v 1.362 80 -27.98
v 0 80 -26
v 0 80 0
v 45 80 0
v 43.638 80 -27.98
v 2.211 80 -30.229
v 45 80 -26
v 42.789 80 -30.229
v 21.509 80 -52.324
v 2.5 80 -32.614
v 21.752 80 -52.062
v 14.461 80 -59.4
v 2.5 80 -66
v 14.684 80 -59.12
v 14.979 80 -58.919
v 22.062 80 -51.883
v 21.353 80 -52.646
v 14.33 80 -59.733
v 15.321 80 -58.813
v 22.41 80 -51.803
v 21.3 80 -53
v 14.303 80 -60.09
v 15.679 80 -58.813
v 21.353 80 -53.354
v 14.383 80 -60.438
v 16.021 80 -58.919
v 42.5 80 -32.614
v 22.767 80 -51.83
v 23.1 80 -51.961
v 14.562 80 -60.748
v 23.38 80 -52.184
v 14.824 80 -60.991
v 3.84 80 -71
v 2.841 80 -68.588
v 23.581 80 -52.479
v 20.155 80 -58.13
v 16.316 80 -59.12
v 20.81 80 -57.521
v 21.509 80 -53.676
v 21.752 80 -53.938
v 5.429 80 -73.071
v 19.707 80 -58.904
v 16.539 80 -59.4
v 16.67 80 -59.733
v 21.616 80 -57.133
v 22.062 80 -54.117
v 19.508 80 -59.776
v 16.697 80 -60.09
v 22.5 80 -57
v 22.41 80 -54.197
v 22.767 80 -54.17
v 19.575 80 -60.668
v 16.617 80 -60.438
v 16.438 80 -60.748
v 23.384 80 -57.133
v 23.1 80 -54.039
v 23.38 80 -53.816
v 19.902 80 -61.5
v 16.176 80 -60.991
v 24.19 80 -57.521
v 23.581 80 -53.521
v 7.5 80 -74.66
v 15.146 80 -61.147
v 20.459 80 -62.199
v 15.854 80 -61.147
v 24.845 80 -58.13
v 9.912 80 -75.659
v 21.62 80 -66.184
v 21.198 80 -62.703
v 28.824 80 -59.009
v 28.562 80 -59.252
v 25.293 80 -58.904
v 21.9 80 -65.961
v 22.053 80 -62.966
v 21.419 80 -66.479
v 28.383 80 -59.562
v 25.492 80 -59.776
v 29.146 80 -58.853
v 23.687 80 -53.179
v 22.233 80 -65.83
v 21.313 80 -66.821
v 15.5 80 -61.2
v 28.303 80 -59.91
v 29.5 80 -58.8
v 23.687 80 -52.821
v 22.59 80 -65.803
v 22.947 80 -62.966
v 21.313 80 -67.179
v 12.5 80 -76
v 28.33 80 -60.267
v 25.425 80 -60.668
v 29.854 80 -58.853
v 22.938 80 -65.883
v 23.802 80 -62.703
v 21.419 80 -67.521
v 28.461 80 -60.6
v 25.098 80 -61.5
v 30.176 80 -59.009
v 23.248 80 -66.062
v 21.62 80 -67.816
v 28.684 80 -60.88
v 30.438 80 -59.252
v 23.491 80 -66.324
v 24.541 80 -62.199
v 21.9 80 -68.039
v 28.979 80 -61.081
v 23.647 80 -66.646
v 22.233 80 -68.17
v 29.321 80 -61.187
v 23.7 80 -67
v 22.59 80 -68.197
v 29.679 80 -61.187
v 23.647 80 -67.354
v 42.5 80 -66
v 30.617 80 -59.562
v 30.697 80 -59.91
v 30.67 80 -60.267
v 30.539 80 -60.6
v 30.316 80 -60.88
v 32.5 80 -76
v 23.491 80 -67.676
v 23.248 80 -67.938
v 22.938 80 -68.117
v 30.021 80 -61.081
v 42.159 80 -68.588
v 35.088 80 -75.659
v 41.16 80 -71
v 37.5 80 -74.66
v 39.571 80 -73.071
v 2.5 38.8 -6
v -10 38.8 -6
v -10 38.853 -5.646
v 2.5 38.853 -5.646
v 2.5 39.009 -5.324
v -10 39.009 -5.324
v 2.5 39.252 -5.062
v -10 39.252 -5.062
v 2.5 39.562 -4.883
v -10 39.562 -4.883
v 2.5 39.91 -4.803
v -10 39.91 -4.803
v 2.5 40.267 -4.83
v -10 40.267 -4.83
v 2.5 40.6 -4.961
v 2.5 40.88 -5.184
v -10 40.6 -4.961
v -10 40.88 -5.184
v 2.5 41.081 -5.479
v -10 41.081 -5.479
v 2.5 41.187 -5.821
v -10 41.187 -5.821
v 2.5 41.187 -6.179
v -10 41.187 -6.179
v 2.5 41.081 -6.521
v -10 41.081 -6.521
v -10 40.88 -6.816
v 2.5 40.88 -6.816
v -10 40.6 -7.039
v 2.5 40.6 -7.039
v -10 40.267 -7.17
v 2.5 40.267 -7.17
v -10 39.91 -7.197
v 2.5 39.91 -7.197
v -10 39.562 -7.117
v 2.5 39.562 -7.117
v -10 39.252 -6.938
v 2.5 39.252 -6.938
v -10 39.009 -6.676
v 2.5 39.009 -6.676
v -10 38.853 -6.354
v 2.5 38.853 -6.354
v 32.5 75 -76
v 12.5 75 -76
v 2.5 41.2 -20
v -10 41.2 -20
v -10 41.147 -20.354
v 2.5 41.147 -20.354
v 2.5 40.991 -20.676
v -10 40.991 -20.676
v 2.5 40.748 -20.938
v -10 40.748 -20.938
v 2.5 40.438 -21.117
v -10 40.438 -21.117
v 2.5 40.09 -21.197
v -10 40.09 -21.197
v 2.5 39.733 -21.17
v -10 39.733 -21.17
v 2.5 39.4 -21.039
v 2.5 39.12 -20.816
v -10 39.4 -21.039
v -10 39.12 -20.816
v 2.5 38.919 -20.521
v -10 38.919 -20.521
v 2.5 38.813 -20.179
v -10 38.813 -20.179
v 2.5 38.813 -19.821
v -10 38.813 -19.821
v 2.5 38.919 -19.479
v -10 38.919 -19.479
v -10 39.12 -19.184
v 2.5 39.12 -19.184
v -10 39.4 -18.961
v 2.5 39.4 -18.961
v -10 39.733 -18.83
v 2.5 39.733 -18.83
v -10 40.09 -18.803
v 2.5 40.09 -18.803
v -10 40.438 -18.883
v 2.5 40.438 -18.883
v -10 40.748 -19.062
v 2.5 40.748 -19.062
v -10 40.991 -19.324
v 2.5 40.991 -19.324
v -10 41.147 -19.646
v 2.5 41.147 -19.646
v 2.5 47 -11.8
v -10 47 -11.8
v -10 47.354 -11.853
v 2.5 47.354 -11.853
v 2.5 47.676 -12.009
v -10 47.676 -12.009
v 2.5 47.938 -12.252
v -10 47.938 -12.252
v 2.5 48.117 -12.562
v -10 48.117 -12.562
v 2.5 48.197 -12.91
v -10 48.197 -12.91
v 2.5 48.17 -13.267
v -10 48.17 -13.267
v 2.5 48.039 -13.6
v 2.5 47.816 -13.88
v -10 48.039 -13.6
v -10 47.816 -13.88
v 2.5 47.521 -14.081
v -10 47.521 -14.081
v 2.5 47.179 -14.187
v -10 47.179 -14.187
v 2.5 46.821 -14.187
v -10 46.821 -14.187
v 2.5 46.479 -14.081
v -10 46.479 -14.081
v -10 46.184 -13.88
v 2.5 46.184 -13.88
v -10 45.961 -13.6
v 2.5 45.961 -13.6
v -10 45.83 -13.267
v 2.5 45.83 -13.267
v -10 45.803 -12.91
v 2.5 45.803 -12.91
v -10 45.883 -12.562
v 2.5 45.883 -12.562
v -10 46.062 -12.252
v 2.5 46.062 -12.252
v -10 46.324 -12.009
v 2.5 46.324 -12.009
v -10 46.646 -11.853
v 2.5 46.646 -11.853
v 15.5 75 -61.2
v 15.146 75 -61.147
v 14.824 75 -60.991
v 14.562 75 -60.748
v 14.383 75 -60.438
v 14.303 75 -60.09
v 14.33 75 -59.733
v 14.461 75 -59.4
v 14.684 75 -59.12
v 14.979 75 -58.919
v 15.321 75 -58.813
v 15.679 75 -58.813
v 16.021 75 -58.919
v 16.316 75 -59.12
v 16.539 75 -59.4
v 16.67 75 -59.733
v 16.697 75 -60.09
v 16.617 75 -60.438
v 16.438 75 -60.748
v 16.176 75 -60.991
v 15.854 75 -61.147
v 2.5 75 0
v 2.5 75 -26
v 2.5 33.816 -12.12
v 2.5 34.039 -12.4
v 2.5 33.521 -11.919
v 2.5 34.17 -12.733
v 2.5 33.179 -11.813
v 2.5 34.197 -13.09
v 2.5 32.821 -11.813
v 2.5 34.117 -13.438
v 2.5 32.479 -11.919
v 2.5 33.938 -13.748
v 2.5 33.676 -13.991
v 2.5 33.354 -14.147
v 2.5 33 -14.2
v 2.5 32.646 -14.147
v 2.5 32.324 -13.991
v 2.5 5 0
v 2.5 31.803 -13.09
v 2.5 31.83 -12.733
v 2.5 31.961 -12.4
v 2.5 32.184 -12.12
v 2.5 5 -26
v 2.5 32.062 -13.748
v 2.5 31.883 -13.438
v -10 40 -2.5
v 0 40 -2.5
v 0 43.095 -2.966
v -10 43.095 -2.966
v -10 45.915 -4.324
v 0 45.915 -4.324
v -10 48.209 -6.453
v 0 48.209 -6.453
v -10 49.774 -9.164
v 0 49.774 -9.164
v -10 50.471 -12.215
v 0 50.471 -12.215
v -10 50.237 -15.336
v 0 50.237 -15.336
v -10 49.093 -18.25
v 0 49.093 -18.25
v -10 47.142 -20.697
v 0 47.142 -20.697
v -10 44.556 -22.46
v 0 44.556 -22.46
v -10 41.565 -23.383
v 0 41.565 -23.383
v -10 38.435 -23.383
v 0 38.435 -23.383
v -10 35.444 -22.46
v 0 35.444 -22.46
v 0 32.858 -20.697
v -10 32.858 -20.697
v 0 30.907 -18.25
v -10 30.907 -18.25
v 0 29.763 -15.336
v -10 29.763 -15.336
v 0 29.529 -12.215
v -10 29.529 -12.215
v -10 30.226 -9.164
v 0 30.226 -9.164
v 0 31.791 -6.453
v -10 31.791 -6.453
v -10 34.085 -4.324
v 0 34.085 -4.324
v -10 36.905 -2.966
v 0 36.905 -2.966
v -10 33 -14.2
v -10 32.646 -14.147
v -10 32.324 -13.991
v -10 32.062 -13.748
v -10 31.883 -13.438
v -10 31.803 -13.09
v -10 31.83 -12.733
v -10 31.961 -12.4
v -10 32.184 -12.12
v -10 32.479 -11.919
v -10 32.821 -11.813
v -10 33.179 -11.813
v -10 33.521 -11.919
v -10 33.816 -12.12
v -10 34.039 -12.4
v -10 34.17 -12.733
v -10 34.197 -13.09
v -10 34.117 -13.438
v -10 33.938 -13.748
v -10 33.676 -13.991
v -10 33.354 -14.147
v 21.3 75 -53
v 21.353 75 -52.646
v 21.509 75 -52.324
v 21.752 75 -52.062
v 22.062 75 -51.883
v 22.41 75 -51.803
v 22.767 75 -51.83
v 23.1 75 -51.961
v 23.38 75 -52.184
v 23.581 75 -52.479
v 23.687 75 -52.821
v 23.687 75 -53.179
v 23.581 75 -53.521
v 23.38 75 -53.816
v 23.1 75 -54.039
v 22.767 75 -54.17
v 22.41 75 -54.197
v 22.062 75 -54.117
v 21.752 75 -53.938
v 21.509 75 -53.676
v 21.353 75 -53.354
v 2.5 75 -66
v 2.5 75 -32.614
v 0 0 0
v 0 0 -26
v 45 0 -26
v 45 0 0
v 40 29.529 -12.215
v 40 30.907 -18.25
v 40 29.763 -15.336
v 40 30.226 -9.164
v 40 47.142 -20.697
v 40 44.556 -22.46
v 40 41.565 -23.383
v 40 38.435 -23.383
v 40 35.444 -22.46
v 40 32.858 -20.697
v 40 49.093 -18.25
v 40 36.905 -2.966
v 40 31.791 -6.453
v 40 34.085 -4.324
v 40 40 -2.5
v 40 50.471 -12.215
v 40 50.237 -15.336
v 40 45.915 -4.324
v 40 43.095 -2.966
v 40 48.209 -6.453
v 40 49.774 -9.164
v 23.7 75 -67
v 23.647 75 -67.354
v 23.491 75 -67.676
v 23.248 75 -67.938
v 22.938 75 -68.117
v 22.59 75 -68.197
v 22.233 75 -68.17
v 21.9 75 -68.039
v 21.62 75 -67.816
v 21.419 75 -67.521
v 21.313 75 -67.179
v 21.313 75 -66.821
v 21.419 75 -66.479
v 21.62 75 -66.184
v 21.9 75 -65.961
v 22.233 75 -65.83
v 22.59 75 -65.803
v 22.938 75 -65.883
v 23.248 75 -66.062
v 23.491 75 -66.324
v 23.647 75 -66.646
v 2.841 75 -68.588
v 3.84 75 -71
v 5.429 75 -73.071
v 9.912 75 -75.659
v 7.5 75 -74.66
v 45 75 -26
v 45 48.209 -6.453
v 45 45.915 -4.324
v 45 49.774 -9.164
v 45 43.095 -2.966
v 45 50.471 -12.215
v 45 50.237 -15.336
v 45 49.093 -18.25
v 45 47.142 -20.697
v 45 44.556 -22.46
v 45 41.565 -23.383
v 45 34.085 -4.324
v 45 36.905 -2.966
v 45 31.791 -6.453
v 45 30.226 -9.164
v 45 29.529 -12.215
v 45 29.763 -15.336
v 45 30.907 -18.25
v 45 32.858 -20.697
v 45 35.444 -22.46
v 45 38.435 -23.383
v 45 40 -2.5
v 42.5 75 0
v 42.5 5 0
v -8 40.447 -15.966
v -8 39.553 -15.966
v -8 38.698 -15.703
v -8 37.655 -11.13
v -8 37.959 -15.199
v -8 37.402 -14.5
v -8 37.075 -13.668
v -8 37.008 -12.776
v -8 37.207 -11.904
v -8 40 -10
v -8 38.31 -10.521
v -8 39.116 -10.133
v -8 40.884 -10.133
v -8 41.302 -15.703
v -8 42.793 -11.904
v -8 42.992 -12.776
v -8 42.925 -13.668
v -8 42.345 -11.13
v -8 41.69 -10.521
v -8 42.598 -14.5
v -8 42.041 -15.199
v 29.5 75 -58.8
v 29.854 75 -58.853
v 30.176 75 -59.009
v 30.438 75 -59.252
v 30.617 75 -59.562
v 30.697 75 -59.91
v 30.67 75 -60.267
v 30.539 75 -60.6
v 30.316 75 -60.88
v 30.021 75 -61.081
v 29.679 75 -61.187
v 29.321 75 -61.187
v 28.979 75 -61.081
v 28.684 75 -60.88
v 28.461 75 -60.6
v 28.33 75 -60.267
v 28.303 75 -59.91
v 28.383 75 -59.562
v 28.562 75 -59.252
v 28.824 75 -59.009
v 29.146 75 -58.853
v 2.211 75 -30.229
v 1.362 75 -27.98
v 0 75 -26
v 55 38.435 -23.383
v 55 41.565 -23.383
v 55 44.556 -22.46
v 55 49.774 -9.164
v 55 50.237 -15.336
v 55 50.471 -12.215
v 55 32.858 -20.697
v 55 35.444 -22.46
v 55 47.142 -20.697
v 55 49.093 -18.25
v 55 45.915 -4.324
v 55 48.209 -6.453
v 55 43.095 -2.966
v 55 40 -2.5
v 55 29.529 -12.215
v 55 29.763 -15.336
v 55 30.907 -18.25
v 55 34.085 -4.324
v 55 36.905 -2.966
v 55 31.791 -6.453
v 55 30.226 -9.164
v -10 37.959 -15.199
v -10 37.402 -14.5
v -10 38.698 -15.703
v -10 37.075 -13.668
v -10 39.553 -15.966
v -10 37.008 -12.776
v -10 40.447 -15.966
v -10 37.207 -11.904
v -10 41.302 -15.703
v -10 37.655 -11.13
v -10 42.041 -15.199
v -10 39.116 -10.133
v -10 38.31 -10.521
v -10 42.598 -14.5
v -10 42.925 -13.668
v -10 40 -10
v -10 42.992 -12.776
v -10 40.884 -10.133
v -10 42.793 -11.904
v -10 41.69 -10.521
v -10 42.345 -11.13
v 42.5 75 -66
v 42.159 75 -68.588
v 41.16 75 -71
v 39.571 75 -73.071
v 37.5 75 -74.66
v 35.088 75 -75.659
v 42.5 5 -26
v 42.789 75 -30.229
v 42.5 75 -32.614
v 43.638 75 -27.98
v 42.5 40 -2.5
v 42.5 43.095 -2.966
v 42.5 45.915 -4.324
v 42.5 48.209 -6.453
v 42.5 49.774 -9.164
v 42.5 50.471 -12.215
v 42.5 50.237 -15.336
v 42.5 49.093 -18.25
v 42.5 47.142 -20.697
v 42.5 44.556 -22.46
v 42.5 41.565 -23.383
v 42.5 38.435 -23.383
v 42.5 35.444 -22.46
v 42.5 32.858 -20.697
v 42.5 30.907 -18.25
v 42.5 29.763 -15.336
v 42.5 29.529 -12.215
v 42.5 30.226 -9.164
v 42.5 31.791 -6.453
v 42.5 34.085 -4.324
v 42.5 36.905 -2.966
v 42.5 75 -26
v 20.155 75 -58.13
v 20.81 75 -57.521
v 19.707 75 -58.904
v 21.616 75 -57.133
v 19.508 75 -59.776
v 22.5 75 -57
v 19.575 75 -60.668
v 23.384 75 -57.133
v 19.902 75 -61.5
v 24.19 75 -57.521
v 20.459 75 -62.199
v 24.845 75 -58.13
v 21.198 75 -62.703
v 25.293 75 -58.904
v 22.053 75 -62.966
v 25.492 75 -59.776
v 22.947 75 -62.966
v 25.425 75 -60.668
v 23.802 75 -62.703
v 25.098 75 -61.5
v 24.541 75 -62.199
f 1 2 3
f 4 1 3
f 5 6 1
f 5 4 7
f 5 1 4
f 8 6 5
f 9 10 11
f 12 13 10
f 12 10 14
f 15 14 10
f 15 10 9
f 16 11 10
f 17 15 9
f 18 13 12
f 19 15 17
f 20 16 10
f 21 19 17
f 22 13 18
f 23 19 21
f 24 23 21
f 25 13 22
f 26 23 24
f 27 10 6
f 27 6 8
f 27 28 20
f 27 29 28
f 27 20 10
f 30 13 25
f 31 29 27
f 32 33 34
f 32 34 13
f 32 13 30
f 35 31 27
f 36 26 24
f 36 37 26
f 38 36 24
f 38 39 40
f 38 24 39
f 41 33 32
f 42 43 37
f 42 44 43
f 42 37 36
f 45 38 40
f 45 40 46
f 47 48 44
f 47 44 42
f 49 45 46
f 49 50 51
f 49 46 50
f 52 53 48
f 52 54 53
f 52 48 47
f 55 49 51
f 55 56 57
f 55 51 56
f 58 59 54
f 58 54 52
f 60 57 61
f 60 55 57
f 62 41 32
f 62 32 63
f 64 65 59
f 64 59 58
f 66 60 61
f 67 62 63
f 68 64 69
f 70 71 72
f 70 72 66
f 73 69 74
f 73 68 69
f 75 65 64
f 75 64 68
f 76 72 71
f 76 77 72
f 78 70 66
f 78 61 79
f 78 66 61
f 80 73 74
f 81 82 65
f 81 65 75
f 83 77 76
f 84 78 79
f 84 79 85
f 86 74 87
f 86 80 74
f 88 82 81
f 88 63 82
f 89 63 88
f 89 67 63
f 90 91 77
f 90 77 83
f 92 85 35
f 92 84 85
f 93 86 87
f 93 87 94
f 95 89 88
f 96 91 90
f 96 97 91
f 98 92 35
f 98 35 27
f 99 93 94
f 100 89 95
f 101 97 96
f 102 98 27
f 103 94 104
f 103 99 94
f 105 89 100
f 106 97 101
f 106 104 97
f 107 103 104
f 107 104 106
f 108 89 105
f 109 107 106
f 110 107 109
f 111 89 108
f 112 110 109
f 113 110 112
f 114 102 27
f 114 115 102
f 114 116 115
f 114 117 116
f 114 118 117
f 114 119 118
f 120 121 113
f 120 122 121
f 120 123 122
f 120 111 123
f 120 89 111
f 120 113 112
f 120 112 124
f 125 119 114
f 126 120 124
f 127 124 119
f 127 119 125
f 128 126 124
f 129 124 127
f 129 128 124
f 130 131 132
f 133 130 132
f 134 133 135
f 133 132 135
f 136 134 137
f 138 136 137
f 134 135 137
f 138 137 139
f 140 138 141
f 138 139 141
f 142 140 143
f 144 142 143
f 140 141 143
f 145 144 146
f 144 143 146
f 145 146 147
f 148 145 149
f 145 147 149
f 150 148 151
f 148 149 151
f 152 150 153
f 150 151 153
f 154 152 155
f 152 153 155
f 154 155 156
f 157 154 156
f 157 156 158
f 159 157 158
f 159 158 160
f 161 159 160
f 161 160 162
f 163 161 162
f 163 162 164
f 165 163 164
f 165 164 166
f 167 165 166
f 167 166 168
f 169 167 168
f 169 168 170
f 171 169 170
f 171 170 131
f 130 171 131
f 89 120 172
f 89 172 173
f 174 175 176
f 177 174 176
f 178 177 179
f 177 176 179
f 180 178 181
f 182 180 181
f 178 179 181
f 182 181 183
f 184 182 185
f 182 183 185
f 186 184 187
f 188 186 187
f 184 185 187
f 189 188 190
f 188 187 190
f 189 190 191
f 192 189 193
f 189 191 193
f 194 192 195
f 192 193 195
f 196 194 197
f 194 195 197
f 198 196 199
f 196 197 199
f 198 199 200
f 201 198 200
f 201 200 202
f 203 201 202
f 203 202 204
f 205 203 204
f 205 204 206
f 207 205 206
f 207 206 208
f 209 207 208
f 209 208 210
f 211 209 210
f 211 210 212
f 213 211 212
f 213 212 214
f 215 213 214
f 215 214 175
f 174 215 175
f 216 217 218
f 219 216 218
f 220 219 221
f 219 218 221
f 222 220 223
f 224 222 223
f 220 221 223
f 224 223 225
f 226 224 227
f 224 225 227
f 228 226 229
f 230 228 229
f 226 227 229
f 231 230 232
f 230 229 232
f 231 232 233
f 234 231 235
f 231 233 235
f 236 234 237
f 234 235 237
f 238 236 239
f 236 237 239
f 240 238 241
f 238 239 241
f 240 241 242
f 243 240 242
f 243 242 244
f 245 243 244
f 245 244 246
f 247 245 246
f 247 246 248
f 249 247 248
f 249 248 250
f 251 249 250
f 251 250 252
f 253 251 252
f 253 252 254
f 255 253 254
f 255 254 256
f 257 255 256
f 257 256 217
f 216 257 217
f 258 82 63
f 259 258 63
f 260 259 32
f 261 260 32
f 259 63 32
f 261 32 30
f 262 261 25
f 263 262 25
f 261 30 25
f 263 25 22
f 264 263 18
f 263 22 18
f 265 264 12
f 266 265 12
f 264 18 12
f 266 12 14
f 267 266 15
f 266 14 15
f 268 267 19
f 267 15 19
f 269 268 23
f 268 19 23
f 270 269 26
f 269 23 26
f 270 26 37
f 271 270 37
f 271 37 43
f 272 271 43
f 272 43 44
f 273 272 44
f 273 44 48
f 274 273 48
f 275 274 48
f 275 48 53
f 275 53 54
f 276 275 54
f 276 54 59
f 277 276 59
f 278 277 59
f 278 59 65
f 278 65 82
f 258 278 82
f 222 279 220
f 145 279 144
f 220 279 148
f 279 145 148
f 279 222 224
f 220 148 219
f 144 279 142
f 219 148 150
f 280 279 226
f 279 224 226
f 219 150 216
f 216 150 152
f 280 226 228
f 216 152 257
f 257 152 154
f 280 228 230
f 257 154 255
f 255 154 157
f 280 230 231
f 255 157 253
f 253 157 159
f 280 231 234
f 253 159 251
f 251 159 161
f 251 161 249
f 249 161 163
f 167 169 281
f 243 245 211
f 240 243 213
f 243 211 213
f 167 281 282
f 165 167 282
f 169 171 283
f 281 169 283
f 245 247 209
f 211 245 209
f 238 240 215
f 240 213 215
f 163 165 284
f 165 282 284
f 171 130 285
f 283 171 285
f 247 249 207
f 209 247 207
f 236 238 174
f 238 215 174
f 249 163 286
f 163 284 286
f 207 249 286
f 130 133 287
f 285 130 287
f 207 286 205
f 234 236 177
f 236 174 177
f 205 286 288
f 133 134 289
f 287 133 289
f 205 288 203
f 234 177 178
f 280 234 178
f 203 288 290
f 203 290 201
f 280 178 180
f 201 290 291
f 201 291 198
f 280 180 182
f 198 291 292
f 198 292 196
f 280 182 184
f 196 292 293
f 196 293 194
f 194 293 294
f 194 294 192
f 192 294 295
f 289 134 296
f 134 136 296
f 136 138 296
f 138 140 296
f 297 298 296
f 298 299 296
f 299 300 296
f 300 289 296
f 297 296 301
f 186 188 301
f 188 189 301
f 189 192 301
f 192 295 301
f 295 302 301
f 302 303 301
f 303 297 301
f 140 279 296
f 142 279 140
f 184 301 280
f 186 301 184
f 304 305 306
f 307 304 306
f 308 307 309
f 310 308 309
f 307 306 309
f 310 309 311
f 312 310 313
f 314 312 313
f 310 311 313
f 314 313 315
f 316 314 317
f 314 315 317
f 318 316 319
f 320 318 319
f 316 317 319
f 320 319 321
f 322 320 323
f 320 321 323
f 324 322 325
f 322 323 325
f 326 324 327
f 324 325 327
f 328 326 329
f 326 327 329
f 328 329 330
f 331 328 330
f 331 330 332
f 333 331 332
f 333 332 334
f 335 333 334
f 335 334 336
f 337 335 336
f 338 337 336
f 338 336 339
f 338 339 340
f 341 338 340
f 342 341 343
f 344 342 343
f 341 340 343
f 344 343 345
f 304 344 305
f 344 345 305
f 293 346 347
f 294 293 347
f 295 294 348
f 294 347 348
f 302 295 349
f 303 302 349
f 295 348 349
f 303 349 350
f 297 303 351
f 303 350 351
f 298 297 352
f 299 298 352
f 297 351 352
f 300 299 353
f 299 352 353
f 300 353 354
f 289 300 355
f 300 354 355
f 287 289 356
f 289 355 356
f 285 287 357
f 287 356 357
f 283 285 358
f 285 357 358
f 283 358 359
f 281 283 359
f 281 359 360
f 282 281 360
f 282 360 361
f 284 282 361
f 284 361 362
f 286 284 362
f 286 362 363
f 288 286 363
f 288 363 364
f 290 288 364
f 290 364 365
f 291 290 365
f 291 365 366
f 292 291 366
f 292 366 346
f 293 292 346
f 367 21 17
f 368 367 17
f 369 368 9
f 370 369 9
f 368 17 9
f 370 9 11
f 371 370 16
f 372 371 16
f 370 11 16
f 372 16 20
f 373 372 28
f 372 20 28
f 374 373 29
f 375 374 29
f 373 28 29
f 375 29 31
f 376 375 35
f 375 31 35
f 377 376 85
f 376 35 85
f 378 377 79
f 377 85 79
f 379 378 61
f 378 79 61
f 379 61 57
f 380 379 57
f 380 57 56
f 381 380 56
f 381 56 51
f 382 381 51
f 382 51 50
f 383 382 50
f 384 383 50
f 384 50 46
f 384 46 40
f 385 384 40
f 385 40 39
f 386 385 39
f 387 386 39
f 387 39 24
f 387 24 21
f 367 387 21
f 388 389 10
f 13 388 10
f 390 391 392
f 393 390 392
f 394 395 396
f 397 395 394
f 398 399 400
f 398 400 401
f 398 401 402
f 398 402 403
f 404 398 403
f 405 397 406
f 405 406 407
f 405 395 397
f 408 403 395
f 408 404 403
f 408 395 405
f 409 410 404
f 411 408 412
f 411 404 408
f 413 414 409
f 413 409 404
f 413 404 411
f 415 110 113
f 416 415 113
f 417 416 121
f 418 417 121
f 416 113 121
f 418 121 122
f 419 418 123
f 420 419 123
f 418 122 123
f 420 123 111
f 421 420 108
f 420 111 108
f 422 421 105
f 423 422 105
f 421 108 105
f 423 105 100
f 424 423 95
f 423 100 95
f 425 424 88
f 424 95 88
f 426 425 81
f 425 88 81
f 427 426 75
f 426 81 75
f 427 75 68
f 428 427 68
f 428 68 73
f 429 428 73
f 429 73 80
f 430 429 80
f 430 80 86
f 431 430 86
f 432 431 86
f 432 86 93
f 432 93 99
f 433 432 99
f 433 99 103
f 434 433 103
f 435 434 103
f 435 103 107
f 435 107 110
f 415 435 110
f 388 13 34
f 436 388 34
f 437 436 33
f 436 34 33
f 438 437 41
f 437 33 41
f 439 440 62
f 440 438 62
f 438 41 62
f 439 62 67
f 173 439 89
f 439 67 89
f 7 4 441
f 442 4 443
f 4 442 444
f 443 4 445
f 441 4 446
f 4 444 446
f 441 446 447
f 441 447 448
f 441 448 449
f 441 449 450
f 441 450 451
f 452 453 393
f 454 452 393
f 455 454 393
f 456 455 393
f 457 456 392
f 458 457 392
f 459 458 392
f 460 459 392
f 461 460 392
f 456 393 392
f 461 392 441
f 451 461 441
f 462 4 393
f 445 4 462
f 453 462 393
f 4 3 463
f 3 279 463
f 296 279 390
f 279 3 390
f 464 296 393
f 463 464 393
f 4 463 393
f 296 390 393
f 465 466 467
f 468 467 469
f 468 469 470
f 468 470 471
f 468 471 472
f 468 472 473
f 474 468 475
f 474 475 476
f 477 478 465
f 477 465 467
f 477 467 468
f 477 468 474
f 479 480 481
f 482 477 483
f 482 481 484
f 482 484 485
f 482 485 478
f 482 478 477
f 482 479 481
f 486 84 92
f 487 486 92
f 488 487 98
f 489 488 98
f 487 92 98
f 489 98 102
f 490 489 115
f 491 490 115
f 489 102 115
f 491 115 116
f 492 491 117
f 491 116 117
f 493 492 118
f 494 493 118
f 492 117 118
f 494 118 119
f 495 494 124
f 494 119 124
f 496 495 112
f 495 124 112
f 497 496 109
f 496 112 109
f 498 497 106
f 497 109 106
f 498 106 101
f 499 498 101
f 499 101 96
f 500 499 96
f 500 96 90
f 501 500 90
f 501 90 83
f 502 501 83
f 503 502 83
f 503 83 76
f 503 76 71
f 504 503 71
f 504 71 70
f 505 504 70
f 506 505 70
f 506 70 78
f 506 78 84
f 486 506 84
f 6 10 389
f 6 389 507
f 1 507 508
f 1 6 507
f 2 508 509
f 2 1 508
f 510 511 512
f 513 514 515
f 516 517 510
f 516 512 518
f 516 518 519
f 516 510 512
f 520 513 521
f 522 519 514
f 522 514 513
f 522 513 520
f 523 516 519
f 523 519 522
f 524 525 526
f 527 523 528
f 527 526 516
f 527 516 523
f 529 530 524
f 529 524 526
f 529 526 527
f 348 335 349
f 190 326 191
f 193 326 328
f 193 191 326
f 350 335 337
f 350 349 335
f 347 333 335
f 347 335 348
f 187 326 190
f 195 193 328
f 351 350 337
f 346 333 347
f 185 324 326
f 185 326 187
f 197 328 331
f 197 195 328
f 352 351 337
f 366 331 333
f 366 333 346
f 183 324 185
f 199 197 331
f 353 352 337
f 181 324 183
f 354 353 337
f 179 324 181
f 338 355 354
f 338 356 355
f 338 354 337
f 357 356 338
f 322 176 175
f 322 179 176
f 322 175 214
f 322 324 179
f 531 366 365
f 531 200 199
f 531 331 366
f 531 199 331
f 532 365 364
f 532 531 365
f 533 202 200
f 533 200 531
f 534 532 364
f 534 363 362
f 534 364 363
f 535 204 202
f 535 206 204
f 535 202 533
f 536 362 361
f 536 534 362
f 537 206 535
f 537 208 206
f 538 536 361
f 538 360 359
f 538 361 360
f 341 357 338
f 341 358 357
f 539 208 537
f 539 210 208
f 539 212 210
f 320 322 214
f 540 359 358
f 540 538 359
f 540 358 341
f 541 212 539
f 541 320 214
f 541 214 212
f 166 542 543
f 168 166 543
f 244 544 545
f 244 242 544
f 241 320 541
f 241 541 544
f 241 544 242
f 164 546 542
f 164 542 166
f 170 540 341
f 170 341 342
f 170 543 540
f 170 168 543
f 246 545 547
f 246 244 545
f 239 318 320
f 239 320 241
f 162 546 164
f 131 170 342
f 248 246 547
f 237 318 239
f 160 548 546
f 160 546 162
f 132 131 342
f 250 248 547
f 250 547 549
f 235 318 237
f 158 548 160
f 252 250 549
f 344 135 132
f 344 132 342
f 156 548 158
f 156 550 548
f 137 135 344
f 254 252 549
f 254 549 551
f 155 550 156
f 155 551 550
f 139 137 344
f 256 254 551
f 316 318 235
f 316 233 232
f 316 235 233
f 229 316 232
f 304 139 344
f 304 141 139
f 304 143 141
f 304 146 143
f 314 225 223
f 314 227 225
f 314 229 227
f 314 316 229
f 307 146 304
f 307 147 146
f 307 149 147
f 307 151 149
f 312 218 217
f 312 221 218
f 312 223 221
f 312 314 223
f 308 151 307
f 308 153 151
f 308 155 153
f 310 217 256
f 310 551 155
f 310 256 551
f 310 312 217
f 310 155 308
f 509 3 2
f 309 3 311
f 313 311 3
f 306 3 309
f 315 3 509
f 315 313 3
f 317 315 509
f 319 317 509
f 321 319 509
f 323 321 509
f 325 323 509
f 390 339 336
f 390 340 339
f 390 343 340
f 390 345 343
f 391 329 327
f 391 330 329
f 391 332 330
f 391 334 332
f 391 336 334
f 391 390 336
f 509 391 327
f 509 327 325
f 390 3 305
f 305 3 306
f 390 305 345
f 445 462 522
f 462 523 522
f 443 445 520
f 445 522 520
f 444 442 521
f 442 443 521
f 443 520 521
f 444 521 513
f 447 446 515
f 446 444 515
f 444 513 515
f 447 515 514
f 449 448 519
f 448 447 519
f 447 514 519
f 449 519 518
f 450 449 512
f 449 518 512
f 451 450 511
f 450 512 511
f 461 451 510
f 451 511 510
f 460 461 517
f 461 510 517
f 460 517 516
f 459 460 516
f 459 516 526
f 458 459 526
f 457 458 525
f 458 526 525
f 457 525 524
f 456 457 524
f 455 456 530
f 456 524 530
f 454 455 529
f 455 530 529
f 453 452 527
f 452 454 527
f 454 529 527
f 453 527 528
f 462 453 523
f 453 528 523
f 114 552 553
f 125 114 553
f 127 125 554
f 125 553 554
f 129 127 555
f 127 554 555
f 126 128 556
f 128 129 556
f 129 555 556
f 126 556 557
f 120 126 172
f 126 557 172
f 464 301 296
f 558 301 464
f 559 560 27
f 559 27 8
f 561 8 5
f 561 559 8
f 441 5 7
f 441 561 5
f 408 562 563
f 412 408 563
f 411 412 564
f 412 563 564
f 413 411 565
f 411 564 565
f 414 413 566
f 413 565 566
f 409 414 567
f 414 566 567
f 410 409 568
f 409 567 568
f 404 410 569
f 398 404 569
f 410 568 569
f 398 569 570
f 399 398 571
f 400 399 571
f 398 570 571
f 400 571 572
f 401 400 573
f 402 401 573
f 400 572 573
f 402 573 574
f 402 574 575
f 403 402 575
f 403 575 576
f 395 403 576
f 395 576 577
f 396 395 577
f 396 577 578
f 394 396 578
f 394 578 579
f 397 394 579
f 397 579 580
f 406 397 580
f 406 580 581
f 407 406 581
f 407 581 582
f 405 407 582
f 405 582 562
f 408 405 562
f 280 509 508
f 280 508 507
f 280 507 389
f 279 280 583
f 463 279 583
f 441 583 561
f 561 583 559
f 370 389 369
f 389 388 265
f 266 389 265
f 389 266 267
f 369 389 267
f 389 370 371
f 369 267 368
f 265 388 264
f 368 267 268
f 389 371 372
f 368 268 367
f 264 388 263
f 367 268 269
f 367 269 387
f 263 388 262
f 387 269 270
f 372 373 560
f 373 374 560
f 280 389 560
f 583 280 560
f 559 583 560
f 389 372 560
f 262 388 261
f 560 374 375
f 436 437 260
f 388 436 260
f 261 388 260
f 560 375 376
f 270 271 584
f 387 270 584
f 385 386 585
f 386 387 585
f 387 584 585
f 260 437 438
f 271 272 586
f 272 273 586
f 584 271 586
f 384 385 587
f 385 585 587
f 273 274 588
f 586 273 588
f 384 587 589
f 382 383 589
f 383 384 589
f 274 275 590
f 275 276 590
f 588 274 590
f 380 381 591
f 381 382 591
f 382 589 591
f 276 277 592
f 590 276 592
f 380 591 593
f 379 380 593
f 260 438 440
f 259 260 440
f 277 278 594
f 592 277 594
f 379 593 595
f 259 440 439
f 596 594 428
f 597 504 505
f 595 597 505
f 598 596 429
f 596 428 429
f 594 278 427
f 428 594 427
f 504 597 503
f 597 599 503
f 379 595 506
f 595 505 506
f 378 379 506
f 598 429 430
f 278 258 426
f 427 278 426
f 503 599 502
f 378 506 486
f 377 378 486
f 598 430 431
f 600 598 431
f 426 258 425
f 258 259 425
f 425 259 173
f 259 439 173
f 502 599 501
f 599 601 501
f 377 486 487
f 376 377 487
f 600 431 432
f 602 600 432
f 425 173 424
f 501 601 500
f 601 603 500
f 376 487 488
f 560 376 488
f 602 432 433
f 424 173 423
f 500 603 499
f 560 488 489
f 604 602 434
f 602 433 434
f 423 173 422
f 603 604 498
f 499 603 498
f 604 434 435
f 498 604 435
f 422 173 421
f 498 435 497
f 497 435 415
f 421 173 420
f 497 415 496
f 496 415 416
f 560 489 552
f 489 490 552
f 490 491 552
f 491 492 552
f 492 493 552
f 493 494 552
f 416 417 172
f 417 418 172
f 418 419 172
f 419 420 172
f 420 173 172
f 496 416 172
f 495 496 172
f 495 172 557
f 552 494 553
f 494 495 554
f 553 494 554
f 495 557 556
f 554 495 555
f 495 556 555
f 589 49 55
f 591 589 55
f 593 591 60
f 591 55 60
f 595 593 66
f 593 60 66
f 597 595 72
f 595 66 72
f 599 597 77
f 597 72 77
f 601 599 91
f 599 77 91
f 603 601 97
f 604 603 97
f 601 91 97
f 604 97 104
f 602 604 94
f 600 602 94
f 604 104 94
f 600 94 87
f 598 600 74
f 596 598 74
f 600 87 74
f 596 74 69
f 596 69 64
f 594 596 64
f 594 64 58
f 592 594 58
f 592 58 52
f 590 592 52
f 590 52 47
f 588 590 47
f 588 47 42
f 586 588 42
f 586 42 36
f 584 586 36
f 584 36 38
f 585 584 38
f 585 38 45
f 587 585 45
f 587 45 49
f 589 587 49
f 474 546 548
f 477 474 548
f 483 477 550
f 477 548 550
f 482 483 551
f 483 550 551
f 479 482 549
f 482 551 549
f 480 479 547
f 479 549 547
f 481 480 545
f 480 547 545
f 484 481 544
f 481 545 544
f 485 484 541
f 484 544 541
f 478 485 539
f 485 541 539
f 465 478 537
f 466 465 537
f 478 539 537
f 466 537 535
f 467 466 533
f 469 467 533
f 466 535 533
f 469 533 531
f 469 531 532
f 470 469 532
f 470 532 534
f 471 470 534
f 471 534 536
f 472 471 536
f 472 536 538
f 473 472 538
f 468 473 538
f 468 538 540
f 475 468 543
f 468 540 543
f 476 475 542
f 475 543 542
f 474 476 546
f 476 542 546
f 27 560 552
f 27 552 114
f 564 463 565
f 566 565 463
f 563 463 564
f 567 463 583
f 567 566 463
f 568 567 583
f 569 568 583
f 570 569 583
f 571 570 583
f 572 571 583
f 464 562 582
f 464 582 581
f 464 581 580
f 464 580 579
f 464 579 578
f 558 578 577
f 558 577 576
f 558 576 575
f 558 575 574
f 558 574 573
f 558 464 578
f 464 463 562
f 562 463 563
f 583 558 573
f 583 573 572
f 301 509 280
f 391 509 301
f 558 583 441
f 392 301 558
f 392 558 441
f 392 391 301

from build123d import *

# Parameters (mm, degrees)
SKETCH1_W           = 45
SKETCH1_H           = 26
BOSS_EXTRUDE1_DEPTH = 5
SKETCH2_W           = 2.5
SKETCH2_H           = 26
BOSS_EXTRUDE2_DEPTH = 70
LPATTERN2_COUNT     = 2
LPATTERN2_PITCH     = 42.5
SKETCH3_W           = 45
SKETCH3_H           = 26
BOSS_EXTRUDE3_DEPTH = 5
SKETCH7_R           = 10.5
BOSS_EXTRUDE5_DEPTH = 10
LPATTERN3_COUNT     = 2
LPATTERN3_PITCH     = 50
CUT_EXTRUDE1_REACH  = 105.325
SKETCH8_R           = 1.2
CIRPATTERN1_COUNT   = 4
SKETCH9_R           = 3
CUT_EXTRUDE2_DEPTH  = 2
BOSS_EXTRUDE6_START = 5
SKETCH10_R          = 10.5
BOSS_EXTRUDE6_DEPTH = 5
SKETCH11_W          = 40
SKETCH11_H          = 5
BOSS_EXTRUDE7_DEPTH = 50
FILLET1_R           = 10
SKETCH12_R          = 3
SKETCH12_R_2        = 1.2
CUT_EXTRUDE3_DEPTH  = 50
CIRPATTERN2_COUNT   = 4


with BuildPart() as part:
    # Sketch1 → Boss-Extrude1 (new body)
    with BuildSketch(Plane(origin=(0, 0, 0), x_dir=(1, 0, 0), z_dir=(0, 1, 0))):
        with Locations((22.5, 13)):
            Rectangle(SKETCH1_W, SKETCH1_H)
    extrude(amount=BOSS_EXTRUDE1_DEPTH)

    # Sketch2 → Boss-Extrude2 (add)
    with BuildSketch(Plane(origin=(0, 5, 0), x_dir=(1, 0, 0), z_dir=(0, 1, 0))):
        with Locations((1.25, 13)):
            Rectangle(SKETCH2_W, SKETCH2_H)
    boss_extrude2 = extrude(amount=BOSS_EXTRUDE2_DEPTH)

    # LPattern2: Boss-Extrude2 ×2
    with Locations(*[(i * LPATTERN2_PITCH, 0, 0) for i in range(1, LPATTERN2_COUNT)]):
        add(boss_extrude2)

    # Sketch3 → Boss-Extrude3 (add)
    with BuildSketch(Plane(origin=(0, 75, 0), x_dir=(1, 0, 0), z_dir=(0, 1, 0))):
        with Locations((22.5, 13)):
            Rectangle(SKETCH3_W, SKETCH3_H)
    extrude(amount=BOSS_EXTRUDE3_DEPTH)

    # Sketch7 → Boss-Extrude5 (add)
    with BuildSketch(Plane.ZY):
        with Locations((-13, 40)):
            Circle(SKETCH7_R)
    boss_extrude5 = extrude(amount=BOSS_EXTRUDE5_DEPTH)

    # LPattern3: Boss-Extrude5 ×2
    with Locations(*[(i * LPATTERN3_PITCH, 0, 0) for i in range(1, LPATTERN3_COUNT)]):
        add(boss_extrude5)

    # Sketch8 → Cut-Extrude1 (cut, up to next)
    with BuildSketch(Plane.ZY.offset(10), mode=Mode.PRIVATE) as cut_extrude1_sk1:
        with Locations((-13, 47)):
            Circle(SKETCH8_R)
    cut_extrude1_tool1 = extrude(cut_extrude1_sk1.sketch, amount=-CUT_EXTRUDE1_REACH, mode=Mode.PRIVATE) & part.part
    cut_extrude1 = cut_extrude1_tool1.solids().sort_by_distance((-10, 47, -13))[0]
    add(cut_extrude1, mode=Mode.SUBTRACT)

    # CirPattern1: Cut-Extrude1 ×4 about axis
    cirpattern1_axis = Axis((0, 40, -13), (1, 0, 0))
    for i in range(1, CIRPATTERN1_COUNT):
        add(cut_extrude1.rotate(cirpattern1_axis, i * 360 / CIRPATTERN1_COUNT), mode=Mode.SUBTRACT)

    # Sketch9 → Cut-Extrude2 (cut)
    with BuildSketch(Plane.ZY.offset(10)):
        with Locations((-13, 40)):
            Circle(SKETCH9_R)
    extrude(amount=-CUT_EXTRUDE2_DEPTH, mode=Mode.SUBTRACT)

    # Sketch10 → Boss-Extrude6 (add)
    with BuildSketch(Plane(origin=(50, 0, 0), x_dir=(0, 0, -1), z_dir=(1, 0, 0)).offset(BOSS_EXTRUDE6_START)):
        with Locations(Location((13, 40, 0), (0, 0, 180))):
            Circle(SKETCH10_R)
    extrude(amount=-BOSS_EXTRUDE6_DEPTH)

    # Sketch11 → Boss-Extrude7 (add)
    with BuildSketch(Plane(origin=(0, 0, -26), x_dir=(-1, 0, 0), z_dir=(0, 0, -1))):
        with Locations((-22.5, 77.5)):
            Rectangle(SKETCH11_W, SKETCH11_H)
    extrude(amount=BOSS_EXTRUDE7_DEPTH)

    # Fillet1
    # the kernel refuses this fillet: 10 mm, written as the material it adds along each edge
    with BuildSketch(Plane(origin=(2.5, 80, -26), x_dir=(-1, 0, 0), z_dir=(0, -1, 0)), Plane(origin=(42.5, 75, -26), x_dir=(1, 0, 0), z_dir=(0, 1, 0))) as fillet1_piece_1:
        with BuildLine():
            CenterArc((10, 6.614378278), FILLET1_R, 180, 41.409622109)
            Line((0, 6.614378278), (0, 0))
            Line((0, 0), (2.5, 0))
        make_face()
    extrude(amount=5)
    # the kernel refuses this fillet: 10 mm, written as the material it takes off along each edge
    with BuildSketch(Plane(origin=(2.5, 105, -76), x_dir=(0, 0, 1), z_dir=(0, -1, 0))) as fillet1_2_piece_1:
        with BuildLine():
            CenterArc((FILLET1_R, -FILLET1_R), FILLET1_R, 90, 90)
            Line((0, -FILLET1_R), (0, 0))
            Line((0, 0), (FILLET1_R, 0))
        make_face()
    extrude(amount=55, mode=Mode.SUBTRACT)
    with BuildSketch(Plane(origin=(42.5, 50, -76), x_dir=(-1, 0, 0), z_dir=(0, 1, 0))) as fillet1_2_piece_2:
        with BuildLine():
            CenterArc((FILLET1_R, FILLET1_R), FILLET1_R, 180, 90)
            Line((0, FILLET1_R), (0, 0))
            Line((0, 0), (FILLET1_R, 0))
        make_face()
    extrude(amount=55, mode=Mode.SUBTRACT)

    # Sketch12 → Cut-Extrude3 (cut)
    with BuildSketch(Plane(origin=(0, 80, 0), x_dir=(1, 0, 0), z_dir=(0, 1, 0))):
        with Locations(Location((22.5, 60, 0), (0, 0, 270))):
            Circle(SKETCH12_R)
        with Locations(Location((29.5, 60, 0), (0, 0, 270))):
            Circle(SKETCH12_R_2)
    cut_extrude3 = extrude(amount=-CUT_EXTRUDE3_DEPTH, mode=Mode.SUBTRACT)

    # CirPattern2: Cut-Extrude3 ×4 about axis
    cirpattern2_axis = Axis((22.5, 0, -60), (0, 1, 0))
    for i in range(1, CIRPATTERN2_COUNT):
        add(cut_extrude3.rotate(cirpattern2_axis, i * 360 / CIRPATTERN2_COUNT), mode=Mode.SUBTRACT)


solid = part.part
